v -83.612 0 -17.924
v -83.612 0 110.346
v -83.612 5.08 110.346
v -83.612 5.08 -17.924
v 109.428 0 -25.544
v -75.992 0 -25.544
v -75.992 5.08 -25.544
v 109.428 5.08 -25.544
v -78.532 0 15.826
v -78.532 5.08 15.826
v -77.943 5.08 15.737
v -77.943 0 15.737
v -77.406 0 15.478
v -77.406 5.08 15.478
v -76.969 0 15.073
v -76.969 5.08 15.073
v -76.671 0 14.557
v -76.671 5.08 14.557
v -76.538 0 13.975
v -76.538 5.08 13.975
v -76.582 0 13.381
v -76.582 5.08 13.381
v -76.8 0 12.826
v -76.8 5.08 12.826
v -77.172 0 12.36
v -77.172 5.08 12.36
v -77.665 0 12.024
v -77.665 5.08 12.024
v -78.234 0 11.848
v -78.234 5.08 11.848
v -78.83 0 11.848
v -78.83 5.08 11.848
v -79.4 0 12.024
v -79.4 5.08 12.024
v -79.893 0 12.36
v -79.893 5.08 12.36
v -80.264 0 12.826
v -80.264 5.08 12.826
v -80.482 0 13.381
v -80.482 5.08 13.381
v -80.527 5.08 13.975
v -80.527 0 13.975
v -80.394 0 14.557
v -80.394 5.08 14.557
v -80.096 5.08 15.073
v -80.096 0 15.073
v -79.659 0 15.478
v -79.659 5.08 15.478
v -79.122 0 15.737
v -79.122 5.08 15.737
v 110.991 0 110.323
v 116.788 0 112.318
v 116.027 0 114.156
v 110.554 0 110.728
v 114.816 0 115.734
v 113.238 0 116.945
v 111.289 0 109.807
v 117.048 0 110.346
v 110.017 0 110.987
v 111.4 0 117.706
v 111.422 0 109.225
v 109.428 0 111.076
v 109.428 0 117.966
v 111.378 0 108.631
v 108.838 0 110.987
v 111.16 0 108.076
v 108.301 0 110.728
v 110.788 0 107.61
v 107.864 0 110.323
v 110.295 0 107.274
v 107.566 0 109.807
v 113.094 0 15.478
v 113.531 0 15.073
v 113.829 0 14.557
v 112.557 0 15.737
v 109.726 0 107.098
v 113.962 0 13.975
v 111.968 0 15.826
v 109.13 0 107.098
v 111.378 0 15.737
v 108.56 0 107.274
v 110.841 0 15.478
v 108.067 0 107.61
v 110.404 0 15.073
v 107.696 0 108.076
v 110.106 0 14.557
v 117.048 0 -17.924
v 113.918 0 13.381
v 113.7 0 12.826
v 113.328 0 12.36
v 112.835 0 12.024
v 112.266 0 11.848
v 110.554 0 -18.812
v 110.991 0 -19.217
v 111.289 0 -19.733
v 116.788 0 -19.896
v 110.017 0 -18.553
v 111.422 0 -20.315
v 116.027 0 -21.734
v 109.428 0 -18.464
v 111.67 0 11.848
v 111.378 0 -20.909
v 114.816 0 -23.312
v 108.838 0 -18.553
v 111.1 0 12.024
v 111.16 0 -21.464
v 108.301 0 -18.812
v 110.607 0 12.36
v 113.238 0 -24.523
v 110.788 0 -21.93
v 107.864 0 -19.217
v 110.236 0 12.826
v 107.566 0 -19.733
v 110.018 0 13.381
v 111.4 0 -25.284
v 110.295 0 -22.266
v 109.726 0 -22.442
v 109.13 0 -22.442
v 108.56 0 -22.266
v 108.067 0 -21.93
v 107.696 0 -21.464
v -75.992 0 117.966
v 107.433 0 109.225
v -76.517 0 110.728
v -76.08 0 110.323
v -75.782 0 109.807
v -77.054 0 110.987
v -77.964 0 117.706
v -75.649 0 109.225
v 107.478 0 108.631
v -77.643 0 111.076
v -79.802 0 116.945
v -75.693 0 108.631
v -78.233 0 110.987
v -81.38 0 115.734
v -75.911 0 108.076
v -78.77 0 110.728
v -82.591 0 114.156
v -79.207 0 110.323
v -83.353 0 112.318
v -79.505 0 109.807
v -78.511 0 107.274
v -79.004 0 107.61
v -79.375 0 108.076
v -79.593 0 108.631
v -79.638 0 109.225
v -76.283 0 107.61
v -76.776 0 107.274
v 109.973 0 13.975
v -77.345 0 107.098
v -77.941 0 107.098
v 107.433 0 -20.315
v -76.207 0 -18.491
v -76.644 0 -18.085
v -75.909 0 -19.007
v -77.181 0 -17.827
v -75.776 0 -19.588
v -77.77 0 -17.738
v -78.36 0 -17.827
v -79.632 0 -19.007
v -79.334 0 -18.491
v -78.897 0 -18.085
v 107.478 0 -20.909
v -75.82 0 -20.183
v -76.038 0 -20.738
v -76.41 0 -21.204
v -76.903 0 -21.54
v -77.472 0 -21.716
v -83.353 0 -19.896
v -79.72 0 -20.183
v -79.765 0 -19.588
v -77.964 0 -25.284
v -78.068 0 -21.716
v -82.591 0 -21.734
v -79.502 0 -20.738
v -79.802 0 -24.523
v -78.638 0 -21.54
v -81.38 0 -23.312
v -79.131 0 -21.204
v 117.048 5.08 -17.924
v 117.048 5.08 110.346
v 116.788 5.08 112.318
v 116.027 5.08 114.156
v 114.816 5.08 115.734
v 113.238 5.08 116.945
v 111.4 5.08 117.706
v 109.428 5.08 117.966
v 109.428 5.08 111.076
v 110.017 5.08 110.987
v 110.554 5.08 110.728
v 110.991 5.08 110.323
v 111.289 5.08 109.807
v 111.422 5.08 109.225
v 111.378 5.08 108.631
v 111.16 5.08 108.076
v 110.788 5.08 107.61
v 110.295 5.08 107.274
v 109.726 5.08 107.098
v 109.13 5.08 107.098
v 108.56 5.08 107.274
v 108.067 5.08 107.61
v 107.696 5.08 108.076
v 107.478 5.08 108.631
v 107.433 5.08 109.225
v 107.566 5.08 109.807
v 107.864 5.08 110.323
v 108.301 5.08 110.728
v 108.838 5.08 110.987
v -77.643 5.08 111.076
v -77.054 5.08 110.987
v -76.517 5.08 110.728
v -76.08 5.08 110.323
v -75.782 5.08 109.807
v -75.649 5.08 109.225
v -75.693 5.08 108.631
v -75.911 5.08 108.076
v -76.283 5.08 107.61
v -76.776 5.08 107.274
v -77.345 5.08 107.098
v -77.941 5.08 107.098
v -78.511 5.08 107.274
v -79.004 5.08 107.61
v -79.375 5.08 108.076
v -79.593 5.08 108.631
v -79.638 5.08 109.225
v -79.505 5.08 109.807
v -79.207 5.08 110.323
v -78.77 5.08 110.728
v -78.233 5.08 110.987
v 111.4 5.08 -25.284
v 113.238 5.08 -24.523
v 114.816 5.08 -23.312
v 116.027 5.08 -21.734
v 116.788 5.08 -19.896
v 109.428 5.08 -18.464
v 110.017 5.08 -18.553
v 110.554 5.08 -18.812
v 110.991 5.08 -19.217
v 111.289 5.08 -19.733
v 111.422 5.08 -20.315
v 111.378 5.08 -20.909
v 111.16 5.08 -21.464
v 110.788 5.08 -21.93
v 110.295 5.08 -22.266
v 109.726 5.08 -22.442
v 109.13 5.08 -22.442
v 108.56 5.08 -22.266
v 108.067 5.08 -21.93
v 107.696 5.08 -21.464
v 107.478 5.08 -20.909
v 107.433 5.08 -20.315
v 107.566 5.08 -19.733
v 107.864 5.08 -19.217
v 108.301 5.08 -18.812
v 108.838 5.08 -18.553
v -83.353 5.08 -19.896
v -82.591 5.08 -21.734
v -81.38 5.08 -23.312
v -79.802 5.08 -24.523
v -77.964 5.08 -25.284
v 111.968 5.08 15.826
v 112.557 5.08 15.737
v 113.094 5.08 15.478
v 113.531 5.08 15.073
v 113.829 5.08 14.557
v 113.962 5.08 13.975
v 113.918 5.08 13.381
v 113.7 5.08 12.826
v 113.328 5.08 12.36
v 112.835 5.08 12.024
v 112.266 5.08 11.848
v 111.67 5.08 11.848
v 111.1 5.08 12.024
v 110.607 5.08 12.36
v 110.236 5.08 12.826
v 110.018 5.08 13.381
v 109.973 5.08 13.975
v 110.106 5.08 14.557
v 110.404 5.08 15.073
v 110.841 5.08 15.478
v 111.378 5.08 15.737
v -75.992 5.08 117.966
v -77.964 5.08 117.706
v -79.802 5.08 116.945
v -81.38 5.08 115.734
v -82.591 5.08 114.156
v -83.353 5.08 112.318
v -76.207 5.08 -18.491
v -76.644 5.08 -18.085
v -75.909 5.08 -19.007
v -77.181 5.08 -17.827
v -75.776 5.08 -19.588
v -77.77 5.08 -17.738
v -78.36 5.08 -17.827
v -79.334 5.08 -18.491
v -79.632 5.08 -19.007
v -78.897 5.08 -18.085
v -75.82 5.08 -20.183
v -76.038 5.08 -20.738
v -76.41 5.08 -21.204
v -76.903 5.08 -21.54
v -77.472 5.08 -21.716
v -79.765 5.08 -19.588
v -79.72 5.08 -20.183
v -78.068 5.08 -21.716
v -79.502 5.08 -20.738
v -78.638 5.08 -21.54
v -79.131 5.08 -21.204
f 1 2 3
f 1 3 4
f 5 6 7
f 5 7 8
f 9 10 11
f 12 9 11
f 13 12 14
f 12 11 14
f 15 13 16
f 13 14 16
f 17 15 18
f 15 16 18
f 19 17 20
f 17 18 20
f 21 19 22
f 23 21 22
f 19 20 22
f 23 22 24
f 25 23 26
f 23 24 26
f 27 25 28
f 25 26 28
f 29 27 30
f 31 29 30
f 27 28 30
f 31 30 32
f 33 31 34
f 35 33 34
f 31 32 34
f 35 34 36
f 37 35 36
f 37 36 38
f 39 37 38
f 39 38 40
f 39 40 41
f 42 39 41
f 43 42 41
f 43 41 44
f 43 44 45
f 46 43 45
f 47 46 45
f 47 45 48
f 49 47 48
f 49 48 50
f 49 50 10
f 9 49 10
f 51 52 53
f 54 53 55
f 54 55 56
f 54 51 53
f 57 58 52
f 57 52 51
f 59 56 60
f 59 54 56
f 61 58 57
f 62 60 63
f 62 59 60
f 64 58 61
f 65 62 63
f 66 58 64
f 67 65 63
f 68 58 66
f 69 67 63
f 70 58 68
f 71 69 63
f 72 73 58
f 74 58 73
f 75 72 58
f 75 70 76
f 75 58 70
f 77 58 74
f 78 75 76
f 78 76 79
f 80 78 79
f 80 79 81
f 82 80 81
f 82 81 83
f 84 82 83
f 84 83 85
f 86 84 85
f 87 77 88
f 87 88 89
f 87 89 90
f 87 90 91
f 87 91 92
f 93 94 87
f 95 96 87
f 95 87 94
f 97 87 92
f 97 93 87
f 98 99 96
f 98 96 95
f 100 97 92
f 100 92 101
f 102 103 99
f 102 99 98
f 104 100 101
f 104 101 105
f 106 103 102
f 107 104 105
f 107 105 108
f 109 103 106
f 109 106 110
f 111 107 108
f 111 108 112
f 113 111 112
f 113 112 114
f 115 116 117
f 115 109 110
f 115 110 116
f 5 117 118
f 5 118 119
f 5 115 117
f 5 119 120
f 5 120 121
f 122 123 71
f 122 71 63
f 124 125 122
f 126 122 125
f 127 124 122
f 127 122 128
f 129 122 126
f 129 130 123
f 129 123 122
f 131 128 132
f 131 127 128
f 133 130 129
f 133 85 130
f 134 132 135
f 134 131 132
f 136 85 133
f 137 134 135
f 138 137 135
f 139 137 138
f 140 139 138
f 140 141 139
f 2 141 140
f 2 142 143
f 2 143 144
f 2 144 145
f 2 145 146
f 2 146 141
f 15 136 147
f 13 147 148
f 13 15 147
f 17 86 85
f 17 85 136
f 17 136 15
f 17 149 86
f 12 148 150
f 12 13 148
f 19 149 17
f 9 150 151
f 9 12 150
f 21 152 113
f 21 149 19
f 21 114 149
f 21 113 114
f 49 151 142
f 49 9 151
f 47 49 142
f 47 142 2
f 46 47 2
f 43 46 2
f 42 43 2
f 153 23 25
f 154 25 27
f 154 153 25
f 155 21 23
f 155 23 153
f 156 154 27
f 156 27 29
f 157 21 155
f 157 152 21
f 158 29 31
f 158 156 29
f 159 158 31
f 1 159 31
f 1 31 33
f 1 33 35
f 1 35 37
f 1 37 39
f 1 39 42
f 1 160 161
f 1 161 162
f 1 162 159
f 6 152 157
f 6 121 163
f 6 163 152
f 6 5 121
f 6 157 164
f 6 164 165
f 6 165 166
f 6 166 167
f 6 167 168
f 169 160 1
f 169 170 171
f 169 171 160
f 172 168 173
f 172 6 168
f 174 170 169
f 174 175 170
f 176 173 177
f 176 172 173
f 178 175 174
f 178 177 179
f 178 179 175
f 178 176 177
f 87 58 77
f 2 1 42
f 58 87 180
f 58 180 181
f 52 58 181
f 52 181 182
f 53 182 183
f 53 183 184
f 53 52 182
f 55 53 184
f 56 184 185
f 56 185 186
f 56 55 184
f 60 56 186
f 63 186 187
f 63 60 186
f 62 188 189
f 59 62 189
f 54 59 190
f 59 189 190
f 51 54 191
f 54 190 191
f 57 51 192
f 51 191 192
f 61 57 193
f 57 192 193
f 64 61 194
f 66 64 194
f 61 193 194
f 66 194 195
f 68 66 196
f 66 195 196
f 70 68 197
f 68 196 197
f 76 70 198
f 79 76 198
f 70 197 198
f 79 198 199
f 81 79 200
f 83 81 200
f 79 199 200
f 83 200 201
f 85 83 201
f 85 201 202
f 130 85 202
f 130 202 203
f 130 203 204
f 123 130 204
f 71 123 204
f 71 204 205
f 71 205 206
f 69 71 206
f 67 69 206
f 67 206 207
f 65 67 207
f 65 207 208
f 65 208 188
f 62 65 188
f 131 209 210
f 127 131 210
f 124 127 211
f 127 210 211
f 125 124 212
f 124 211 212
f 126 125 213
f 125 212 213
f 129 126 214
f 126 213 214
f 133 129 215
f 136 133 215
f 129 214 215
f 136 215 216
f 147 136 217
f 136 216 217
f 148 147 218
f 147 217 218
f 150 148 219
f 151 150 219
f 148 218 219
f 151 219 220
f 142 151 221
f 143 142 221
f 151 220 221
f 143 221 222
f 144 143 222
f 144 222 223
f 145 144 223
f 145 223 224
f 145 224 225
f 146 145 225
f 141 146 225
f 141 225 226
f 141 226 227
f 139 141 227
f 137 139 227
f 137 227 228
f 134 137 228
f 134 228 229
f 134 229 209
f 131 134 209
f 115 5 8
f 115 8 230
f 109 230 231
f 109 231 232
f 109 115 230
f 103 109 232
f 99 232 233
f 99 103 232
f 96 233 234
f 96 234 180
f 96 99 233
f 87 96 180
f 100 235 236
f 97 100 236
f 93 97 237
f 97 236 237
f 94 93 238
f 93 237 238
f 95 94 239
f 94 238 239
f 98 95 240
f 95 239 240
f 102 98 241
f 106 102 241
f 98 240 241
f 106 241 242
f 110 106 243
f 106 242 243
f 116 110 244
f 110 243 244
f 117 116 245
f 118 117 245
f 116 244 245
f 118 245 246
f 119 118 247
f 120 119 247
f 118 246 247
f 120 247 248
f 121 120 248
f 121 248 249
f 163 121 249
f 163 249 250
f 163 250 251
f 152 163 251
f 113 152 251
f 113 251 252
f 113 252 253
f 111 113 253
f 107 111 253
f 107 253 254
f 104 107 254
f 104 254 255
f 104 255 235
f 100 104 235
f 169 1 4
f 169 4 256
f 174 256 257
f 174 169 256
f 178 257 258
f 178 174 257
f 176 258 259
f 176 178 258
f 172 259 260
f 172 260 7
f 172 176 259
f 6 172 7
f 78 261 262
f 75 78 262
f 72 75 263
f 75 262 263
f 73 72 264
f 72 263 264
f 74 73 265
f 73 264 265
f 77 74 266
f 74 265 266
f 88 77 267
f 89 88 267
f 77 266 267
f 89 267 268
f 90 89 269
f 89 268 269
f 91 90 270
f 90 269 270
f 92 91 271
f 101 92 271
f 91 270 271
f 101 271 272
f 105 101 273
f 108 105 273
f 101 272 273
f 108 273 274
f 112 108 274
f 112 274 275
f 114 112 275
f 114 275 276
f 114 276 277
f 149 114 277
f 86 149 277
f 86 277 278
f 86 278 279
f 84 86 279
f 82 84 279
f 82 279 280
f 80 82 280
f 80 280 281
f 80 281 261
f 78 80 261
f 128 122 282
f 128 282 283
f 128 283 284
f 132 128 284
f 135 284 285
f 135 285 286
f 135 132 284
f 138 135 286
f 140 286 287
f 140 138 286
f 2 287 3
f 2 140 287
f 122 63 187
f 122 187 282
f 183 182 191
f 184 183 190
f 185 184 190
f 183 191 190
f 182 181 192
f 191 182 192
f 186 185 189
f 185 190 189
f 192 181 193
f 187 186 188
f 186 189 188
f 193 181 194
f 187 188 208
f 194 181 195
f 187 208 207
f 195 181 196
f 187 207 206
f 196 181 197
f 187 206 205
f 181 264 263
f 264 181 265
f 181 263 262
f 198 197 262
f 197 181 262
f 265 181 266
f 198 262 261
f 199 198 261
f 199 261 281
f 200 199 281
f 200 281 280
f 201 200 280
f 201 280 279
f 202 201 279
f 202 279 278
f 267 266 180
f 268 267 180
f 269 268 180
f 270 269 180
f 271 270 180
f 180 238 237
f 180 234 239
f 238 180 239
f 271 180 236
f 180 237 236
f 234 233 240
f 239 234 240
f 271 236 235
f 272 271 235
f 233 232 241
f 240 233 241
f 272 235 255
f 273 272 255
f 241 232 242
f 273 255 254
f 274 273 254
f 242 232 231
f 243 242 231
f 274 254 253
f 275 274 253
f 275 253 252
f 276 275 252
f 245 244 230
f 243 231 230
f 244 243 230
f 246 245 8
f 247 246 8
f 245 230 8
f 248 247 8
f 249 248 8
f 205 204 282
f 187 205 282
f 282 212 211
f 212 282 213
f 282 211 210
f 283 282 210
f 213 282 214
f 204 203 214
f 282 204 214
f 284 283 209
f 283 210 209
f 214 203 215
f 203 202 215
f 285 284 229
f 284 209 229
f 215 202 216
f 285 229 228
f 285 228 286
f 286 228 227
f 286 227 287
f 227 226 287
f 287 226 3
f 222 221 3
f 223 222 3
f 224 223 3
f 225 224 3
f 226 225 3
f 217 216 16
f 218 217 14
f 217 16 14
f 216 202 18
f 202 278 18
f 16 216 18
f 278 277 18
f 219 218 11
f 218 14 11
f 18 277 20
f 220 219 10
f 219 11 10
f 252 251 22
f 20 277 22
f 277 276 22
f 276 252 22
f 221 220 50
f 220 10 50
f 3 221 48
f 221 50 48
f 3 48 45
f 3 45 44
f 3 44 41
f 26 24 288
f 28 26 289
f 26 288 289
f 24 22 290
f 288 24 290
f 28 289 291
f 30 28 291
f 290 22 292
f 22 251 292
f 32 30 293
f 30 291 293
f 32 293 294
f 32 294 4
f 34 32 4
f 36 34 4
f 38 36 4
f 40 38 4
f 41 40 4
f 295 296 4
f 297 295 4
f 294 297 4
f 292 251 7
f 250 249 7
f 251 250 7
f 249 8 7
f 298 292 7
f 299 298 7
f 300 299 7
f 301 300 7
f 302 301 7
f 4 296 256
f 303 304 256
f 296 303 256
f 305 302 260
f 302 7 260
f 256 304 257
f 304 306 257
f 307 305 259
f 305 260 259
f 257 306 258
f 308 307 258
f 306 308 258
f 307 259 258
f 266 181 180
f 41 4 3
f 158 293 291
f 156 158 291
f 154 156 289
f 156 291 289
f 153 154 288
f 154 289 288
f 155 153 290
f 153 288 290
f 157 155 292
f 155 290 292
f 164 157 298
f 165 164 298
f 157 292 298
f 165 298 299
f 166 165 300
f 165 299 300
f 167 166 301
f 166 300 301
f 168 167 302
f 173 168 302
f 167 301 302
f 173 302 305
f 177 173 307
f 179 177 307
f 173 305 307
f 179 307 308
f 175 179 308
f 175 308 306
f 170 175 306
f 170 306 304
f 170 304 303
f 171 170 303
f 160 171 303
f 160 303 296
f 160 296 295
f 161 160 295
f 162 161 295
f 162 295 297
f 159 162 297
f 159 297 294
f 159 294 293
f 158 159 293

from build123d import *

# Parameters (mm, degrees)
BOSS_EXTRUDE1_DEPTH = 5.08
SKETCH2_R           = 2
SKETCH2_R_2         = 2.000000064
CUT_EXTRUDE1_DEPTH  = 167.258702267


with BuildPart() as part:
    # Sketch1 → Boss-Extrude1 (new body)
    with BuildSketch(Plane(origin=(0, 0, 0), x_dir=(1, 0, 0), z_dir=(0, 1, 0))):
        with BuildLine():
            Line((-75.992267658, 25.543996283), (109.427732342, 25.543996283))
            ThreePointArc((109.427732342, 25.543996283), (114.815886015, 23.312149955), (117.047732342, 17.923996283))
            Line((117.047732342, 17.923996283), (117.047732342, -110.346003717))
            ThreePointArc((117.047732342, -110.346003717), (114.815886015, -115.73415739), (109.427732342, -117.966003717))
            Line((109.427732342, -117.966003717), (-75.992267658, -117.966003717))
            ThreePointArc((-75.992267658, -117.966003717), (-81.380421331, -115.73415739), (-83.612267658, -110.346003717))
            Line((-83.612267658, -110.346003717), (-83.612267658, 17.923996283))
            ThreePointArc((-83.612267658, 17.923996283), (-81.380421331, 23.312149955), (-75.992267658, 25.543996283))
        make_face()
    extrude(amount=BOSS_EXTRUDE1_DEPTH)

    # Sketch2 → Cut-Extrude1 (cut, through all)
    with BuildSketch(Plane(origin=(0, 5.08, 0), x_dir=(1, 0, 0), z_dir=(0, 1, 0))):
        with Locations(Location((-77.770267658, 19.737919103, 0), (0, 0, 270))):
            Circle(SKETCH2_R)
        with Locations(Location((-78.532267658, -13.826003717, 0), (0, 0, 270))):
            Circle(SKETCH2_R)
        with Locations((-78.532267658, -131.936003717)):
            Circle(SKETCH2_R)
        with Locations(Location((-77.643267658, -109.076003717, 0), (0, 0, 270))):
            Circle(SKETCH2_R_2)
        with Locations(Location((109.427732342, -109.076003717, 0), (0, 0, 270))):
            Circle(SKETCH2_R)
        with Locations((111.967732342, -131.936003717)):
            Circle(SKETCH2_R)
        with Locations(Location((111.967732342, -13.826003717, 0), (0, 0, 270))):
            Circle(SKETCH2_R)
        with Locations(Location((109.427732342, 20.463996283, 0), (0, 0, 270))):
            Circle(SKETCH2_R)
    extrude(amount=-CUT_EXTRUDE1_DEPTH, mode=Mode.SUBTRACT)


solid = part.part
